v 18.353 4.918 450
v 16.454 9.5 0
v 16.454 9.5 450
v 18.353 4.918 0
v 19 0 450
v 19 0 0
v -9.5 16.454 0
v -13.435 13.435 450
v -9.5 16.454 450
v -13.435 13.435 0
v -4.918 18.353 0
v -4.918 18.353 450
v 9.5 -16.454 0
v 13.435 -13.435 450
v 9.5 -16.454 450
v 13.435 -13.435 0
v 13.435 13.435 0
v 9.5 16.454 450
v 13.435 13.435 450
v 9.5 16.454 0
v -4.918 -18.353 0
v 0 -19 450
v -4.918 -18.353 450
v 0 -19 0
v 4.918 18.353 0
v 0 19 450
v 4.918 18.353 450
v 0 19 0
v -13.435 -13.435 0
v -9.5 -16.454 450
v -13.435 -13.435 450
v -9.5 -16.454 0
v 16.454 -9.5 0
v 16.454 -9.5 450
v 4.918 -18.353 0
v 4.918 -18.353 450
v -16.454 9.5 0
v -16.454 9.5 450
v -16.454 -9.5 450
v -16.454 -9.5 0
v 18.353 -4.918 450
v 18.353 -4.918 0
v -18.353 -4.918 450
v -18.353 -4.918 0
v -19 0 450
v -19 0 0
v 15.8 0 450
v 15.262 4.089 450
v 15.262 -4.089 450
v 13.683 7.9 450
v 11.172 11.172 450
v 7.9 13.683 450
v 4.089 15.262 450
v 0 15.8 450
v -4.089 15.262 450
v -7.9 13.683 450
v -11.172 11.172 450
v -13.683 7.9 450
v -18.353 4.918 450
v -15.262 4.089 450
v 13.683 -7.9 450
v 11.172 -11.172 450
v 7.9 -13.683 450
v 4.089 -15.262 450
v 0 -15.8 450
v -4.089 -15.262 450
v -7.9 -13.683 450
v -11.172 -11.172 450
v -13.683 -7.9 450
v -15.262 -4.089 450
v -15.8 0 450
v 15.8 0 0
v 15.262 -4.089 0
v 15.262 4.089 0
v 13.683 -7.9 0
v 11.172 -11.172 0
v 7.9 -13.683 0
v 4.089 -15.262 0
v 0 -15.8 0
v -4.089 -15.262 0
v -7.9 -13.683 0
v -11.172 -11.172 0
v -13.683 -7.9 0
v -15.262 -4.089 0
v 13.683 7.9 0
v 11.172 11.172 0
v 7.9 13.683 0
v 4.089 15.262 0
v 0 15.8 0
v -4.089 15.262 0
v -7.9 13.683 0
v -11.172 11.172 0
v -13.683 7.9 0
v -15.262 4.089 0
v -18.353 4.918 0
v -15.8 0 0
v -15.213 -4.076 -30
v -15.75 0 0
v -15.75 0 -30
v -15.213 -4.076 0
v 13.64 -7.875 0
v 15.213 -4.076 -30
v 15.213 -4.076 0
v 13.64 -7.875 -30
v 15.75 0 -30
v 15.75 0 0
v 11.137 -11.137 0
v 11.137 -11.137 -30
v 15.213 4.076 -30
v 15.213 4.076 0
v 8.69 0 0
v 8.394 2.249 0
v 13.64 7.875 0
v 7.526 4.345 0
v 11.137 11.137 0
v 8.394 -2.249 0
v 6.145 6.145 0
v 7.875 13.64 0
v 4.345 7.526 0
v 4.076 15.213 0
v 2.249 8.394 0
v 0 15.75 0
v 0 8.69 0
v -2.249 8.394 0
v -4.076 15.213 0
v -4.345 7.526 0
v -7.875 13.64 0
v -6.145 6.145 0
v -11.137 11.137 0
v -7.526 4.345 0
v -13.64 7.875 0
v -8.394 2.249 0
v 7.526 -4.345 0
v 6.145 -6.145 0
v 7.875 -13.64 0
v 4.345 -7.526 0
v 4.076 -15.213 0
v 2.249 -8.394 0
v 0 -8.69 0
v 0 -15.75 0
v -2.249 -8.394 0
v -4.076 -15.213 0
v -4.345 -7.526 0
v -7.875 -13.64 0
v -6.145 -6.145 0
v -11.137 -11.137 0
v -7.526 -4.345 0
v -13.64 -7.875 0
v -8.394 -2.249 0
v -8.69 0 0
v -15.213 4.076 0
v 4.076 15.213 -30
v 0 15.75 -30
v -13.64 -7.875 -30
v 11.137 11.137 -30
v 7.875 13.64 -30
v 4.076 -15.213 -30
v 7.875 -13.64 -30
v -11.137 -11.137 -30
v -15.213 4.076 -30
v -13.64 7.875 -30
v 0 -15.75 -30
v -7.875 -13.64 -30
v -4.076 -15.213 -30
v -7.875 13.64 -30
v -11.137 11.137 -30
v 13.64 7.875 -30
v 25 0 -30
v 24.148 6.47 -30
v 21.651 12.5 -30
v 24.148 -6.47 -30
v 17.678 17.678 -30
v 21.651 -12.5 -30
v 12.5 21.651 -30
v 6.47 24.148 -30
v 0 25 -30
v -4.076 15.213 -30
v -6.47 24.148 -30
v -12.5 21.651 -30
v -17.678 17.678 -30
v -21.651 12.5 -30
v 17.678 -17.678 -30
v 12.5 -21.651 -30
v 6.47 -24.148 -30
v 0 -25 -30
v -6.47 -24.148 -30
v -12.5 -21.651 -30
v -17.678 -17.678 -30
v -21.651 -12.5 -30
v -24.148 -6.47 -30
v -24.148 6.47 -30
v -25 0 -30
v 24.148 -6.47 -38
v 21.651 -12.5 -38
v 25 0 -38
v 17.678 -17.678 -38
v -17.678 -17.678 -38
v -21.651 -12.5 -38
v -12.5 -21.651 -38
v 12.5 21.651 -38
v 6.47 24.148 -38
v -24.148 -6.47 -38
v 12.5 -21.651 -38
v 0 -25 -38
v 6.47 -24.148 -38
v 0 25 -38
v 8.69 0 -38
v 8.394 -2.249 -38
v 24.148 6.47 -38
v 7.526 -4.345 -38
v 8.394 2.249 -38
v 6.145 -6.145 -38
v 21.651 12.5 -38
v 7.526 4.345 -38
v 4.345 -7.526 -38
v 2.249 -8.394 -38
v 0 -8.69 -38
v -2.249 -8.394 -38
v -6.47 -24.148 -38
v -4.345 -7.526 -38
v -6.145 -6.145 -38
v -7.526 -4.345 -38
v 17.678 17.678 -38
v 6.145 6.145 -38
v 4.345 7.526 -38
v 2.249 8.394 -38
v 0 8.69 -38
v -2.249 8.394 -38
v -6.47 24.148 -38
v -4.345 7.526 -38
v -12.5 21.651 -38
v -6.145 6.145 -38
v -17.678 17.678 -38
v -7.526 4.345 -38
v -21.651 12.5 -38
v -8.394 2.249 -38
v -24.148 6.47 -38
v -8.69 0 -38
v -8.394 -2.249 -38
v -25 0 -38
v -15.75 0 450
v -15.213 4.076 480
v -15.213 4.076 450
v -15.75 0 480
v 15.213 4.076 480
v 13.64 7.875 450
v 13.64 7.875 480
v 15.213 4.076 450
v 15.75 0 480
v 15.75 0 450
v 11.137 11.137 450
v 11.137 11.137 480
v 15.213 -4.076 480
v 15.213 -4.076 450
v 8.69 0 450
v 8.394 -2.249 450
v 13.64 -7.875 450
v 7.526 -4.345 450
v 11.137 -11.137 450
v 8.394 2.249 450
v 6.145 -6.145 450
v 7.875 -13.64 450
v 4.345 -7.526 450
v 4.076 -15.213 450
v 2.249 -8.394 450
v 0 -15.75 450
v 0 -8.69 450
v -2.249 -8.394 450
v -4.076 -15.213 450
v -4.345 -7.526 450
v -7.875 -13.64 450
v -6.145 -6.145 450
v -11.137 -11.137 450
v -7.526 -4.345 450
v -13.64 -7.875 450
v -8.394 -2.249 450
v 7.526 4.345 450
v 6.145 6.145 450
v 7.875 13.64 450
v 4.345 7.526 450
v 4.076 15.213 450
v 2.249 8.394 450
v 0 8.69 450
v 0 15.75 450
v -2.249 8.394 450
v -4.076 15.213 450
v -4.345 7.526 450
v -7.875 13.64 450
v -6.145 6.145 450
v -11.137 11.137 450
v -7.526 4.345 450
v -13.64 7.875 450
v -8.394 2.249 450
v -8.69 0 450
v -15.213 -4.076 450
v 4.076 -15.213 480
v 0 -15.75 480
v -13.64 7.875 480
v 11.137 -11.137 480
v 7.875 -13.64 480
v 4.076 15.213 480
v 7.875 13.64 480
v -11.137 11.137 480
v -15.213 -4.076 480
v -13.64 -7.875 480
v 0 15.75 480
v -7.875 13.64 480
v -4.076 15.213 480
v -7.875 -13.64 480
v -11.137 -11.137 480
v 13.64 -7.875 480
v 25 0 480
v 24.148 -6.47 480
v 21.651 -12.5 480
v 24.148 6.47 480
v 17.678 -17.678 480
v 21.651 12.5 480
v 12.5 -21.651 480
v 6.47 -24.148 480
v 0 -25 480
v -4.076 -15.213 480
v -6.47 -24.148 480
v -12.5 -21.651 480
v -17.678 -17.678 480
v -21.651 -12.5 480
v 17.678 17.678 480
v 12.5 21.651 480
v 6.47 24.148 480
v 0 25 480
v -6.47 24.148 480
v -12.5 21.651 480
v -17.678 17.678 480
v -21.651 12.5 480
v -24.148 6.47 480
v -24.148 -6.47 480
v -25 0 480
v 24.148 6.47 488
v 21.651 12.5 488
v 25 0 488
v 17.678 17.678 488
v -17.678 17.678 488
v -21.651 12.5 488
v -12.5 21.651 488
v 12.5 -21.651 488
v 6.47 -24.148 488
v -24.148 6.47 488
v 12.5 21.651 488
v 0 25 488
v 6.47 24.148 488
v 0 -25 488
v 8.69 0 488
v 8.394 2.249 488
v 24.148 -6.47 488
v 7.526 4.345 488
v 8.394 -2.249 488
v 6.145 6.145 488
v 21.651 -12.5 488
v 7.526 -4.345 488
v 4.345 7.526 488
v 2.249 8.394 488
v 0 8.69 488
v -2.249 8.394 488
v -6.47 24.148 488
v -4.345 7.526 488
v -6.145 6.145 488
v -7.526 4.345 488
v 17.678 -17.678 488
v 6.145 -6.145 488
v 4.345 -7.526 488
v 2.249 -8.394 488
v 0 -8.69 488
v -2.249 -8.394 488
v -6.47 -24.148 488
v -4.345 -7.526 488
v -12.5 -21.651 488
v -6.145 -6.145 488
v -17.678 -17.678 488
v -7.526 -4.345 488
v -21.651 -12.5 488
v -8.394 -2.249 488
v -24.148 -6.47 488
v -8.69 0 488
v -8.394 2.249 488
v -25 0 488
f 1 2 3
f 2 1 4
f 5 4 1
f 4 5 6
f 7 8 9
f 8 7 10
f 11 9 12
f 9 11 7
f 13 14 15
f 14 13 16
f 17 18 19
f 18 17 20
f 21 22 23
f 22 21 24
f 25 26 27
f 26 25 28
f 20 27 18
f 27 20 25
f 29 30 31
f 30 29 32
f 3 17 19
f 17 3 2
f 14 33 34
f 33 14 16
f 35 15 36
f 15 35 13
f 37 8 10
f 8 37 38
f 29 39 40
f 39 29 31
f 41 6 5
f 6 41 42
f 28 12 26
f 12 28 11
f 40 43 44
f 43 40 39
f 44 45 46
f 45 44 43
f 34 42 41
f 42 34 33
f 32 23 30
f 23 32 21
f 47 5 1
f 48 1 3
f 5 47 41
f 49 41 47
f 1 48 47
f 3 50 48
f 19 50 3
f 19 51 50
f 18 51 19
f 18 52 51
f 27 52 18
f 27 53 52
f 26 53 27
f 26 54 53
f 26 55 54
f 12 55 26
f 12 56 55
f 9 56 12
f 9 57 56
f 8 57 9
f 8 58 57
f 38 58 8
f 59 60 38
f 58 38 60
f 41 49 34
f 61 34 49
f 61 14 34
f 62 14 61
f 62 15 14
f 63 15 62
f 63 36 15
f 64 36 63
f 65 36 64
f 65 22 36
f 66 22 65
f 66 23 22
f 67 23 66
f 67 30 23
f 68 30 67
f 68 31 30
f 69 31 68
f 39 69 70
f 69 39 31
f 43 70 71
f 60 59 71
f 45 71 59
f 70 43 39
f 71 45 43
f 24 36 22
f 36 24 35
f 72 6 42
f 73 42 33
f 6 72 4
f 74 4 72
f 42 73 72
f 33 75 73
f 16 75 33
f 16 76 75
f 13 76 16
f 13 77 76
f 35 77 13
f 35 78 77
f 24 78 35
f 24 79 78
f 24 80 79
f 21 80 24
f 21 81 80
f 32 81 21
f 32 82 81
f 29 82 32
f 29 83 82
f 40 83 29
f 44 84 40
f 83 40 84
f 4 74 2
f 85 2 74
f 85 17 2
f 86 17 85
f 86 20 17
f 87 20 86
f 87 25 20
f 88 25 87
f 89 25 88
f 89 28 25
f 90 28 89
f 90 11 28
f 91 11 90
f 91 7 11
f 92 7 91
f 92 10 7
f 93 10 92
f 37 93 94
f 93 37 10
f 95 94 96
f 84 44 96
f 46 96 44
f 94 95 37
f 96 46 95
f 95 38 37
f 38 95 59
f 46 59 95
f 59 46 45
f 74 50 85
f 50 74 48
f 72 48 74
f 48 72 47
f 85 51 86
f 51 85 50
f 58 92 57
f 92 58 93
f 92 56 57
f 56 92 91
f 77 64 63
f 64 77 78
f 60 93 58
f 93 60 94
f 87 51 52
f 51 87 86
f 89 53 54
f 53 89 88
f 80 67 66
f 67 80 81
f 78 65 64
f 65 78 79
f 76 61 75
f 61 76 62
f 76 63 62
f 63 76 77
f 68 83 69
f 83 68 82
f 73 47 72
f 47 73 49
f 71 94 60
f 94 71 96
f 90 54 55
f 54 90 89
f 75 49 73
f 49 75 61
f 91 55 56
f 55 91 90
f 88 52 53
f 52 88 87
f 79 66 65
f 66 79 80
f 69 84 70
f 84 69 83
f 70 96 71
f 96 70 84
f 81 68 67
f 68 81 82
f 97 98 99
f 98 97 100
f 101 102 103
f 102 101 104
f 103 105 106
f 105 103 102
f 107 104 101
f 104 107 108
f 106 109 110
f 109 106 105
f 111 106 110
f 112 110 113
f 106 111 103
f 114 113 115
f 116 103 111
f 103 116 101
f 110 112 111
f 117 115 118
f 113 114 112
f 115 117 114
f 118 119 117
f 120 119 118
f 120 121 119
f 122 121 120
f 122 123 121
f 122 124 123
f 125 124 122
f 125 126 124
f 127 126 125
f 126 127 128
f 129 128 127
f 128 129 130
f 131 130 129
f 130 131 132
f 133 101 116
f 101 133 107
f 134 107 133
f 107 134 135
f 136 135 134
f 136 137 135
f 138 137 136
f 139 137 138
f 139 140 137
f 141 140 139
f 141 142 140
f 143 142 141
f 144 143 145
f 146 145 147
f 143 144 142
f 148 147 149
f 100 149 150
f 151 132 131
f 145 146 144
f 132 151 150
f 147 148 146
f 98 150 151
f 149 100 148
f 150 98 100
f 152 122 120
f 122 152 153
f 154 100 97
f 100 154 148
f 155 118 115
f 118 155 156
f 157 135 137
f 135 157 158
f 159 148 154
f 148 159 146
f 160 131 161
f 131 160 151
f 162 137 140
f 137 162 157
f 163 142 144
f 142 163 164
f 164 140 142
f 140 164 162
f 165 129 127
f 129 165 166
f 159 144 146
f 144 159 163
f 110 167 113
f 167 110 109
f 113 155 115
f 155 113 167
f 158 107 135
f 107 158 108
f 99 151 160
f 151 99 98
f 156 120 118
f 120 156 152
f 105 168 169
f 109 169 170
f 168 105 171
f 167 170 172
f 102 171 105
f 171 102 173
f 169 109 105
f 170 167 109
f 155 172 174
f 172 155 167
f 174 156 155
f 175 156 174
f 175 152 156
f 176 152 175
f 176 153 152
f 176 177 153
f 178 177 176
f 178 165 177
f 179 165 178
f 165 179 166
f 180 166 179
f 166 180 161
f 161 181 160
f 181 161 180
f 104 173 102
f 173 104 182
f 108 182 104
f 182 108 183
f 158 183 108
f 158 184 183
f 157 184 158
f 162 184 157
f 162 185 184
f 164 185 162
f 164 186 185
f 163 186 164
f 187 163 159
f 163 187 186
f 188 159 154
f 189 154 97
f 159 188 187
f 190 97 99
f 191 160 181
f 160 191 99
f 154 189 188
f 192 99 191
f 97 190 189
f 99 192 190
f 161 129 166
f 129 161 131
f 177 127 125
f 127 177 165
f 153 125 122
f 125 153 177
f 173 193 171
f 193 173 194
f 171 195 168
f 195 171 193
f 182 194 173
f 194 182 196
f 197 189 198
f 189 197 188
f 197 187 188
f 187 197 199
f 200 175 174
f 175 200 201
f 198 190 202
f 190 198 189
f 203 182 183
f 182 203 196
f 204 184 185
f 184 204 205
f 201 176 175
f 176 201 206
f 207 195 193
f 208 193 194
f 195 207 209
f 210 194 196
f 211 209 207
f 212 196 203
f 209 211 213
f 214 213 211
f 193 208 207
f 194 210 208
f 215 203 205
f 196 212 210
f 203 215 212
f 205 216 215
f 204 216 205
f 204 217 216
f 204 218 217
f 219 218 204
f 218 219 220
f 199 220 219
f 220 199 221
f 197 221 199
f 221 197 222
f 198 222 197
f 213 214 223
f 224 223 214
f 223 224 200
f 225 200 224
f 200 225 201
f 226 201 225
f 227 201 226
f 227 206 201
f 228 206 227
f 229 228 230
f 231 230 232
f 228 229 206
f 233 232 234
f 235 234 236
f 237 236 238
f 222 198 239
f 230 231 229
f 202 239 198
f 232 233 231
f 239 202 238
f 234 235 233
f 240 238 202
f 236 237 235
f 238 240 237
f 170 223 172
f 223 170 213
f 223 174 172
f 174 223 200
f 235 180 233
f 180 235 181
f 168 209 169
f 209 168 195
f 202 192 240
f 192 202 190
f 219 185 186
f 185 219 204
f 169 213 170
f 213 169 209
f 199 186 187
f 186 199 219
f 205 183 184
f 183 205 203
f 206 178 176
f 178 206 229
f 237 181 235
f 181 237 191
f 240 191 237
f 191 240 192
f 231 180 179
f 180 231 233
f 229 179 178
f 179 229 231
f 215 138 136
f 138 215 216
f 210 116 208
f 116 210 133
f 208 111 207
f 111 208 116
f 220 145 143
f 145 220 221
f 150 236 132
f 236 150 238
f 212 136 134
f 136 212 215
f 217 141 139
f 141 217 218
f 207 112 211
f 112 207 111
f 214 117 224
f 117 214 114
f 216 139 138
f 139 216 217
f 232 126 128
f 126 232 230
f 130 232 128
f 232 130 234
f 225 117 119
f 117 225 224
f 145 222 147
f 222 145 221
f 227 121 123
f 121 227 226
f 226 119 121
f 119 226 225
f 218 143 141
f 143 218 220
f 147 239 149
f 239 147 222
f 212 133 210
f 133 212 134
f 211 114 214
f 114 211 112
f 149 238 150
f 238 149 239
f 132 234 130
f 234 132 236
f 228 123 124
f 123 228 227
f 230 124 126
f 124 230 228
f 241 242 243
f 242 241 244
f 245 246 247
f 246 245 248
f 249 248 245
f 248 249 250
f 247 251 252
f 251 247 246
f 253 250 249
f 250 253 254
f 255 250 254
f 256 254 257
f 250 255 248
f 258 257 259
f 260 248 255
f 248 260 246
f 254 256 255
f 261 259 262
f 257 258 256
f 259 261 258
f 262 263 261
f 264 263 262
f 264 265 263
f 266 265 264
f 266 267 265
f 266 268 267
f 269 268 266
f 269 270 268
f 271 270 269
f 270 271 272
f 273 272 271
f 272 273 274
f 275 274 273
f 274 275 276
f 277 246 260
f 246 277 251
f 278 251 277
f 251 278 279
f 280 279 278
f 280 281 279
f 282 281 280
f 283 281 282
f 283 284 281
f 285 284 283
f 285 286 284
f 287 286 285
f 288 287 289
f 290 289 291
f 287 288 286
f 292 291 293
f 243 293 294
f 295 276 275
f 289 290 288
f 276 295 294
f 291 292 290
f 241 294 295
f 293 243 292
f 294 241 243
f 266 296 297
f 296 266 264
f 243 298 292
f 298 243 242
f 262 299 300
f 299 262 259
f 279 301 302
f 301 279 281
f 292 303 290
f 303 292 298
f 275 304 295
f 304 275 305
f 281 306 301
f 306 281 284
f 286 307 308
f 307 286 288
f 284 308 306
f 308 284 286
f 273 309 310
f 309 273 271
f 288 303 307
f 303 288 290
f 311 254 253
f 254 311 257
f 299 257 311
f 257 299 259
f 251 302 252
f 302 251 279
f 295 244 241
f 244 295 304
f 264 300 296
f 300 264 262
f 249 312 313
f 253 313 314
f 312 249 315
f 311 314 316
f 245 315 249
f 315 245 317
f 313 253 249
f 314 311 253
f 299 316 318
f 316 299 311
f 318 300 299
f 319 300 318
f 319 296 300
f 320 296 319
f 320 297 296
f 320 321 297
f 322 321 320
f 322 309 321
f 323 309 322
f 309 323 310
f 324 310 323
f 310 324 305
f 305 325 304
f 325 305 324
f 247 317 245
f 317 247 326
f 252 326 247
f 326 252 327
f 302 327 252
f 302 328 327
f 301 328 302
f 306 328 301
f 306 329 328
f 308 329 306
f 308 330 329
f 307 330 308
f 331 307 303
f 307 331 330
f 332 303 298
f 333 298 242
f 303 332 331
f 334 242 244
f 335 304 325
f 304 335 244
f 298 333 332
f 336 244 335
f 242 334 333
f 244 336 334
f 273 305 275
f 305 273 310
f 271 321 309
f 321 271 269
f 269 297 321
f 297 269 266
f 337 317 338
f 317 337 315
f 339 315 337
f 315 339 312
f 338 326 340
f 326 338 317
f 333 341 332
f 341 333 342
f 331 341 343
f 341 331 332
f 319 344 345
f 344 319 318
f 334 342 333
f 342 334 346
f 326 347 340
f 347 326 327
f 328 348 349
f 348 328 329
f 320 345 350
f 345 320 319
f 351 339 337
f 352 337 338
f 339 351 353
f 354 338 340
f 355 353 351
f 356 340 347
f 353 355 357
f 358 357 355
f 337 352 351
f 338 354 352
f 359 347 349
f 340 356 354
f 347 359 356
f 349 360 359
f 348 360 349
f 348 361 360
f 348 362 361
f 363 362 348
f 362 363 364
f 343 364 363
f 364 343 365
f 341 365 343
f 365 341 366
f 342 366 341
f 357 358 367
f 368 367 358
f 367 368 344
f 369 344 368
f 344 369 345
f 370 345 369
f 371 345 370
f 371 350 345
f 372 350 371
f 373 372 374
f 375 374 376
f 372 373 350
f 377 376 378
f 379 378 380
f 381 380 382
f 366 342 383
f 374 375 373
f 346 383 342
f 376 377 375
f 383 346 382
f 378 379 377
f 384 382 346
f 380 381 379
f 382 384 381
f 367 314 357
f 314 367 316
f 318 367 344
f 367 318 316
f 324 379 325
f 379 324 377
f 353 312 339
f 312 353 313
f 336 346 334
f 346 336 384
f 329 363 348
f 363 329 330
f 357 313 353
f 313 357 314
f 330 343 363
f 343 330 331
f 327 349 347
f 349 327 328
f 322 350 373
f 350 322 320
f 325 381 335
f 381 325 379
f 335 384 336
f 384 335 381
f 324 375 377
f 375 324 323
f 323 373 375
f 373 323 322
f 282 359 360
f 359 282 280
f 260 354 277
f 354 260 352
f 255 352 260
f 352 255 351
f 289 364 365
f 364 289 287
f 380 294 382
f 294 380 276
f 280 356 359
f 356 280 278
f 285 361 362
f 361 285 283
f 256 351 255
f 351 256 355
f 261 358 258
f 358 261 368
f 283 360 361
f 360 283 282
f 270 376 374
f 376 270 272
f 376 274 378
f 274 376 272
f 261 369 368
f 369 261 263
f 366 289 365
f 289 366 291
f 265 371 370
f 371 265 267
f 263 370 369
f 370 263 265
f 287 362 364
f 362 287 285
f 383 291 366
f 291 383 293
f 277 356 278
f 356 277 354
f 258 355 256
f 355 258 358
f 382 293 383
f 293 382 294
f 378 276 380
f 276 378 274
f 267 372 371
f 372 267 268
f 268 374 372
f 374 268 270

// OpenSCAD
// femur.scad
// Free Humanoid Platform — Leg v0.1 — femur tube parametric
//
// Femur structural tube (BOM femur_tube) + two end-caps (BOM femur_endcap).
// Hip-side end-cap mates to hip-flex cycloidal output flange (cyclo_50).
// Knee-side end-cap mates to knee cycloidal input housing (cyclo_30).
//
// REFERENCE GEOMETRY — NOT VALIDATED BY PHYSICAL BUILD.

include <leg_params.scad>;

// --------------------------------------------------------------------------
// femur_tube_only() — bare aluminum tube
// --------------------------------------------------------------------------
module femur_tube_only(length = femur_tube_length) {
    color("LightSteelBlue")
    difference() {
        cylinder(h = length, d = femur_tube_od, center = false);
        translate([0, 0, -0.1])
            cylinder(h = length + 0.2, d = femur_tube_id, center = false);
    }
}

// --------------------------------------------------------------------------
// femur_endcap(side) — milled aluminum end-cap
//   side = "hip"  → mates cyclo_50 output flange (hip-flex)
//   side = "knee" → mates cyclo_30 input housing (knee)
// --------------------------------------------------------------------------
module femur_endcap(side = "hip") {
    pcd       = (side == "hip") ? cyclo_50_output_pcd : cyclo_30_mount_pcd;
    bolt_m    = (side == "hip") ? cyclo_50_output_bolt_m : cyclo_30_mount_bolt_m;
    bolt_n    = (side == "hip") ? cyclo_50_output_bolt_n : cyclo_30_mount_bolt_n;
    flange_od = femur_tube_od + 12.0;  // 6 mm radial extension for bolt heads

    color("Silver")
    difference() {
        union() {
            // Tube-insertion plug (press-fit into femur ID)
            cylinder(h = end_cap_axial_length,
                     d = femur_tube_id - end_cap_press_int * 2,
                     center = false);
            // Outer flange (sits proud of tube)
            translate([0, 0, end_cap_axial_length])
                cylinder(h = 8.0, d = flange_od, center = false);
        }
        // Central bore (cable/harness pass-through)
        translate([0, 0, -0.1])
            cylinder(h = end_cap_axial_length + 8.2,
                     d = femur_tube_id * 0.55, center = false);
        // Bolt circle
        for (i = [0 : bolt_n - 1]) {
            angle = i * 360 / bolt_n;
            translate([cos(angle) * pcd / 2,
                       sin(angle) * pcd / 2,
                       end_cap_axial_length - 0.1])
                cylinder(h = 8.5,
                         d = (bolt_m == 5) ? m5_clear_dia : m6_clear_dia,
                         center = false);
        }
    }
}

// --------------------------------------------------------------------------
// femur() — complete femur assembly: tube + 2 end-caps
//   knee_side at z=0; hip_side at z=femur_tube_length
// --------------------------------------------------------------------------
module femur() {
    // Tube
    femur_tube_only();
    // Knee-side end-cap (z=0, pointing down)
    rotate([180, 0, 0])
        femur_endcap(side = "knee");
    // Hip-side end-cap (z=length, pointing up)
    translate([0, 0, femur_tube_length])
        femur_endcap(side = "hip");
}

// --------------------------------------------------------------------------
// Demo render when run standalone
// --------------------------------------------------------------------------
femur();
